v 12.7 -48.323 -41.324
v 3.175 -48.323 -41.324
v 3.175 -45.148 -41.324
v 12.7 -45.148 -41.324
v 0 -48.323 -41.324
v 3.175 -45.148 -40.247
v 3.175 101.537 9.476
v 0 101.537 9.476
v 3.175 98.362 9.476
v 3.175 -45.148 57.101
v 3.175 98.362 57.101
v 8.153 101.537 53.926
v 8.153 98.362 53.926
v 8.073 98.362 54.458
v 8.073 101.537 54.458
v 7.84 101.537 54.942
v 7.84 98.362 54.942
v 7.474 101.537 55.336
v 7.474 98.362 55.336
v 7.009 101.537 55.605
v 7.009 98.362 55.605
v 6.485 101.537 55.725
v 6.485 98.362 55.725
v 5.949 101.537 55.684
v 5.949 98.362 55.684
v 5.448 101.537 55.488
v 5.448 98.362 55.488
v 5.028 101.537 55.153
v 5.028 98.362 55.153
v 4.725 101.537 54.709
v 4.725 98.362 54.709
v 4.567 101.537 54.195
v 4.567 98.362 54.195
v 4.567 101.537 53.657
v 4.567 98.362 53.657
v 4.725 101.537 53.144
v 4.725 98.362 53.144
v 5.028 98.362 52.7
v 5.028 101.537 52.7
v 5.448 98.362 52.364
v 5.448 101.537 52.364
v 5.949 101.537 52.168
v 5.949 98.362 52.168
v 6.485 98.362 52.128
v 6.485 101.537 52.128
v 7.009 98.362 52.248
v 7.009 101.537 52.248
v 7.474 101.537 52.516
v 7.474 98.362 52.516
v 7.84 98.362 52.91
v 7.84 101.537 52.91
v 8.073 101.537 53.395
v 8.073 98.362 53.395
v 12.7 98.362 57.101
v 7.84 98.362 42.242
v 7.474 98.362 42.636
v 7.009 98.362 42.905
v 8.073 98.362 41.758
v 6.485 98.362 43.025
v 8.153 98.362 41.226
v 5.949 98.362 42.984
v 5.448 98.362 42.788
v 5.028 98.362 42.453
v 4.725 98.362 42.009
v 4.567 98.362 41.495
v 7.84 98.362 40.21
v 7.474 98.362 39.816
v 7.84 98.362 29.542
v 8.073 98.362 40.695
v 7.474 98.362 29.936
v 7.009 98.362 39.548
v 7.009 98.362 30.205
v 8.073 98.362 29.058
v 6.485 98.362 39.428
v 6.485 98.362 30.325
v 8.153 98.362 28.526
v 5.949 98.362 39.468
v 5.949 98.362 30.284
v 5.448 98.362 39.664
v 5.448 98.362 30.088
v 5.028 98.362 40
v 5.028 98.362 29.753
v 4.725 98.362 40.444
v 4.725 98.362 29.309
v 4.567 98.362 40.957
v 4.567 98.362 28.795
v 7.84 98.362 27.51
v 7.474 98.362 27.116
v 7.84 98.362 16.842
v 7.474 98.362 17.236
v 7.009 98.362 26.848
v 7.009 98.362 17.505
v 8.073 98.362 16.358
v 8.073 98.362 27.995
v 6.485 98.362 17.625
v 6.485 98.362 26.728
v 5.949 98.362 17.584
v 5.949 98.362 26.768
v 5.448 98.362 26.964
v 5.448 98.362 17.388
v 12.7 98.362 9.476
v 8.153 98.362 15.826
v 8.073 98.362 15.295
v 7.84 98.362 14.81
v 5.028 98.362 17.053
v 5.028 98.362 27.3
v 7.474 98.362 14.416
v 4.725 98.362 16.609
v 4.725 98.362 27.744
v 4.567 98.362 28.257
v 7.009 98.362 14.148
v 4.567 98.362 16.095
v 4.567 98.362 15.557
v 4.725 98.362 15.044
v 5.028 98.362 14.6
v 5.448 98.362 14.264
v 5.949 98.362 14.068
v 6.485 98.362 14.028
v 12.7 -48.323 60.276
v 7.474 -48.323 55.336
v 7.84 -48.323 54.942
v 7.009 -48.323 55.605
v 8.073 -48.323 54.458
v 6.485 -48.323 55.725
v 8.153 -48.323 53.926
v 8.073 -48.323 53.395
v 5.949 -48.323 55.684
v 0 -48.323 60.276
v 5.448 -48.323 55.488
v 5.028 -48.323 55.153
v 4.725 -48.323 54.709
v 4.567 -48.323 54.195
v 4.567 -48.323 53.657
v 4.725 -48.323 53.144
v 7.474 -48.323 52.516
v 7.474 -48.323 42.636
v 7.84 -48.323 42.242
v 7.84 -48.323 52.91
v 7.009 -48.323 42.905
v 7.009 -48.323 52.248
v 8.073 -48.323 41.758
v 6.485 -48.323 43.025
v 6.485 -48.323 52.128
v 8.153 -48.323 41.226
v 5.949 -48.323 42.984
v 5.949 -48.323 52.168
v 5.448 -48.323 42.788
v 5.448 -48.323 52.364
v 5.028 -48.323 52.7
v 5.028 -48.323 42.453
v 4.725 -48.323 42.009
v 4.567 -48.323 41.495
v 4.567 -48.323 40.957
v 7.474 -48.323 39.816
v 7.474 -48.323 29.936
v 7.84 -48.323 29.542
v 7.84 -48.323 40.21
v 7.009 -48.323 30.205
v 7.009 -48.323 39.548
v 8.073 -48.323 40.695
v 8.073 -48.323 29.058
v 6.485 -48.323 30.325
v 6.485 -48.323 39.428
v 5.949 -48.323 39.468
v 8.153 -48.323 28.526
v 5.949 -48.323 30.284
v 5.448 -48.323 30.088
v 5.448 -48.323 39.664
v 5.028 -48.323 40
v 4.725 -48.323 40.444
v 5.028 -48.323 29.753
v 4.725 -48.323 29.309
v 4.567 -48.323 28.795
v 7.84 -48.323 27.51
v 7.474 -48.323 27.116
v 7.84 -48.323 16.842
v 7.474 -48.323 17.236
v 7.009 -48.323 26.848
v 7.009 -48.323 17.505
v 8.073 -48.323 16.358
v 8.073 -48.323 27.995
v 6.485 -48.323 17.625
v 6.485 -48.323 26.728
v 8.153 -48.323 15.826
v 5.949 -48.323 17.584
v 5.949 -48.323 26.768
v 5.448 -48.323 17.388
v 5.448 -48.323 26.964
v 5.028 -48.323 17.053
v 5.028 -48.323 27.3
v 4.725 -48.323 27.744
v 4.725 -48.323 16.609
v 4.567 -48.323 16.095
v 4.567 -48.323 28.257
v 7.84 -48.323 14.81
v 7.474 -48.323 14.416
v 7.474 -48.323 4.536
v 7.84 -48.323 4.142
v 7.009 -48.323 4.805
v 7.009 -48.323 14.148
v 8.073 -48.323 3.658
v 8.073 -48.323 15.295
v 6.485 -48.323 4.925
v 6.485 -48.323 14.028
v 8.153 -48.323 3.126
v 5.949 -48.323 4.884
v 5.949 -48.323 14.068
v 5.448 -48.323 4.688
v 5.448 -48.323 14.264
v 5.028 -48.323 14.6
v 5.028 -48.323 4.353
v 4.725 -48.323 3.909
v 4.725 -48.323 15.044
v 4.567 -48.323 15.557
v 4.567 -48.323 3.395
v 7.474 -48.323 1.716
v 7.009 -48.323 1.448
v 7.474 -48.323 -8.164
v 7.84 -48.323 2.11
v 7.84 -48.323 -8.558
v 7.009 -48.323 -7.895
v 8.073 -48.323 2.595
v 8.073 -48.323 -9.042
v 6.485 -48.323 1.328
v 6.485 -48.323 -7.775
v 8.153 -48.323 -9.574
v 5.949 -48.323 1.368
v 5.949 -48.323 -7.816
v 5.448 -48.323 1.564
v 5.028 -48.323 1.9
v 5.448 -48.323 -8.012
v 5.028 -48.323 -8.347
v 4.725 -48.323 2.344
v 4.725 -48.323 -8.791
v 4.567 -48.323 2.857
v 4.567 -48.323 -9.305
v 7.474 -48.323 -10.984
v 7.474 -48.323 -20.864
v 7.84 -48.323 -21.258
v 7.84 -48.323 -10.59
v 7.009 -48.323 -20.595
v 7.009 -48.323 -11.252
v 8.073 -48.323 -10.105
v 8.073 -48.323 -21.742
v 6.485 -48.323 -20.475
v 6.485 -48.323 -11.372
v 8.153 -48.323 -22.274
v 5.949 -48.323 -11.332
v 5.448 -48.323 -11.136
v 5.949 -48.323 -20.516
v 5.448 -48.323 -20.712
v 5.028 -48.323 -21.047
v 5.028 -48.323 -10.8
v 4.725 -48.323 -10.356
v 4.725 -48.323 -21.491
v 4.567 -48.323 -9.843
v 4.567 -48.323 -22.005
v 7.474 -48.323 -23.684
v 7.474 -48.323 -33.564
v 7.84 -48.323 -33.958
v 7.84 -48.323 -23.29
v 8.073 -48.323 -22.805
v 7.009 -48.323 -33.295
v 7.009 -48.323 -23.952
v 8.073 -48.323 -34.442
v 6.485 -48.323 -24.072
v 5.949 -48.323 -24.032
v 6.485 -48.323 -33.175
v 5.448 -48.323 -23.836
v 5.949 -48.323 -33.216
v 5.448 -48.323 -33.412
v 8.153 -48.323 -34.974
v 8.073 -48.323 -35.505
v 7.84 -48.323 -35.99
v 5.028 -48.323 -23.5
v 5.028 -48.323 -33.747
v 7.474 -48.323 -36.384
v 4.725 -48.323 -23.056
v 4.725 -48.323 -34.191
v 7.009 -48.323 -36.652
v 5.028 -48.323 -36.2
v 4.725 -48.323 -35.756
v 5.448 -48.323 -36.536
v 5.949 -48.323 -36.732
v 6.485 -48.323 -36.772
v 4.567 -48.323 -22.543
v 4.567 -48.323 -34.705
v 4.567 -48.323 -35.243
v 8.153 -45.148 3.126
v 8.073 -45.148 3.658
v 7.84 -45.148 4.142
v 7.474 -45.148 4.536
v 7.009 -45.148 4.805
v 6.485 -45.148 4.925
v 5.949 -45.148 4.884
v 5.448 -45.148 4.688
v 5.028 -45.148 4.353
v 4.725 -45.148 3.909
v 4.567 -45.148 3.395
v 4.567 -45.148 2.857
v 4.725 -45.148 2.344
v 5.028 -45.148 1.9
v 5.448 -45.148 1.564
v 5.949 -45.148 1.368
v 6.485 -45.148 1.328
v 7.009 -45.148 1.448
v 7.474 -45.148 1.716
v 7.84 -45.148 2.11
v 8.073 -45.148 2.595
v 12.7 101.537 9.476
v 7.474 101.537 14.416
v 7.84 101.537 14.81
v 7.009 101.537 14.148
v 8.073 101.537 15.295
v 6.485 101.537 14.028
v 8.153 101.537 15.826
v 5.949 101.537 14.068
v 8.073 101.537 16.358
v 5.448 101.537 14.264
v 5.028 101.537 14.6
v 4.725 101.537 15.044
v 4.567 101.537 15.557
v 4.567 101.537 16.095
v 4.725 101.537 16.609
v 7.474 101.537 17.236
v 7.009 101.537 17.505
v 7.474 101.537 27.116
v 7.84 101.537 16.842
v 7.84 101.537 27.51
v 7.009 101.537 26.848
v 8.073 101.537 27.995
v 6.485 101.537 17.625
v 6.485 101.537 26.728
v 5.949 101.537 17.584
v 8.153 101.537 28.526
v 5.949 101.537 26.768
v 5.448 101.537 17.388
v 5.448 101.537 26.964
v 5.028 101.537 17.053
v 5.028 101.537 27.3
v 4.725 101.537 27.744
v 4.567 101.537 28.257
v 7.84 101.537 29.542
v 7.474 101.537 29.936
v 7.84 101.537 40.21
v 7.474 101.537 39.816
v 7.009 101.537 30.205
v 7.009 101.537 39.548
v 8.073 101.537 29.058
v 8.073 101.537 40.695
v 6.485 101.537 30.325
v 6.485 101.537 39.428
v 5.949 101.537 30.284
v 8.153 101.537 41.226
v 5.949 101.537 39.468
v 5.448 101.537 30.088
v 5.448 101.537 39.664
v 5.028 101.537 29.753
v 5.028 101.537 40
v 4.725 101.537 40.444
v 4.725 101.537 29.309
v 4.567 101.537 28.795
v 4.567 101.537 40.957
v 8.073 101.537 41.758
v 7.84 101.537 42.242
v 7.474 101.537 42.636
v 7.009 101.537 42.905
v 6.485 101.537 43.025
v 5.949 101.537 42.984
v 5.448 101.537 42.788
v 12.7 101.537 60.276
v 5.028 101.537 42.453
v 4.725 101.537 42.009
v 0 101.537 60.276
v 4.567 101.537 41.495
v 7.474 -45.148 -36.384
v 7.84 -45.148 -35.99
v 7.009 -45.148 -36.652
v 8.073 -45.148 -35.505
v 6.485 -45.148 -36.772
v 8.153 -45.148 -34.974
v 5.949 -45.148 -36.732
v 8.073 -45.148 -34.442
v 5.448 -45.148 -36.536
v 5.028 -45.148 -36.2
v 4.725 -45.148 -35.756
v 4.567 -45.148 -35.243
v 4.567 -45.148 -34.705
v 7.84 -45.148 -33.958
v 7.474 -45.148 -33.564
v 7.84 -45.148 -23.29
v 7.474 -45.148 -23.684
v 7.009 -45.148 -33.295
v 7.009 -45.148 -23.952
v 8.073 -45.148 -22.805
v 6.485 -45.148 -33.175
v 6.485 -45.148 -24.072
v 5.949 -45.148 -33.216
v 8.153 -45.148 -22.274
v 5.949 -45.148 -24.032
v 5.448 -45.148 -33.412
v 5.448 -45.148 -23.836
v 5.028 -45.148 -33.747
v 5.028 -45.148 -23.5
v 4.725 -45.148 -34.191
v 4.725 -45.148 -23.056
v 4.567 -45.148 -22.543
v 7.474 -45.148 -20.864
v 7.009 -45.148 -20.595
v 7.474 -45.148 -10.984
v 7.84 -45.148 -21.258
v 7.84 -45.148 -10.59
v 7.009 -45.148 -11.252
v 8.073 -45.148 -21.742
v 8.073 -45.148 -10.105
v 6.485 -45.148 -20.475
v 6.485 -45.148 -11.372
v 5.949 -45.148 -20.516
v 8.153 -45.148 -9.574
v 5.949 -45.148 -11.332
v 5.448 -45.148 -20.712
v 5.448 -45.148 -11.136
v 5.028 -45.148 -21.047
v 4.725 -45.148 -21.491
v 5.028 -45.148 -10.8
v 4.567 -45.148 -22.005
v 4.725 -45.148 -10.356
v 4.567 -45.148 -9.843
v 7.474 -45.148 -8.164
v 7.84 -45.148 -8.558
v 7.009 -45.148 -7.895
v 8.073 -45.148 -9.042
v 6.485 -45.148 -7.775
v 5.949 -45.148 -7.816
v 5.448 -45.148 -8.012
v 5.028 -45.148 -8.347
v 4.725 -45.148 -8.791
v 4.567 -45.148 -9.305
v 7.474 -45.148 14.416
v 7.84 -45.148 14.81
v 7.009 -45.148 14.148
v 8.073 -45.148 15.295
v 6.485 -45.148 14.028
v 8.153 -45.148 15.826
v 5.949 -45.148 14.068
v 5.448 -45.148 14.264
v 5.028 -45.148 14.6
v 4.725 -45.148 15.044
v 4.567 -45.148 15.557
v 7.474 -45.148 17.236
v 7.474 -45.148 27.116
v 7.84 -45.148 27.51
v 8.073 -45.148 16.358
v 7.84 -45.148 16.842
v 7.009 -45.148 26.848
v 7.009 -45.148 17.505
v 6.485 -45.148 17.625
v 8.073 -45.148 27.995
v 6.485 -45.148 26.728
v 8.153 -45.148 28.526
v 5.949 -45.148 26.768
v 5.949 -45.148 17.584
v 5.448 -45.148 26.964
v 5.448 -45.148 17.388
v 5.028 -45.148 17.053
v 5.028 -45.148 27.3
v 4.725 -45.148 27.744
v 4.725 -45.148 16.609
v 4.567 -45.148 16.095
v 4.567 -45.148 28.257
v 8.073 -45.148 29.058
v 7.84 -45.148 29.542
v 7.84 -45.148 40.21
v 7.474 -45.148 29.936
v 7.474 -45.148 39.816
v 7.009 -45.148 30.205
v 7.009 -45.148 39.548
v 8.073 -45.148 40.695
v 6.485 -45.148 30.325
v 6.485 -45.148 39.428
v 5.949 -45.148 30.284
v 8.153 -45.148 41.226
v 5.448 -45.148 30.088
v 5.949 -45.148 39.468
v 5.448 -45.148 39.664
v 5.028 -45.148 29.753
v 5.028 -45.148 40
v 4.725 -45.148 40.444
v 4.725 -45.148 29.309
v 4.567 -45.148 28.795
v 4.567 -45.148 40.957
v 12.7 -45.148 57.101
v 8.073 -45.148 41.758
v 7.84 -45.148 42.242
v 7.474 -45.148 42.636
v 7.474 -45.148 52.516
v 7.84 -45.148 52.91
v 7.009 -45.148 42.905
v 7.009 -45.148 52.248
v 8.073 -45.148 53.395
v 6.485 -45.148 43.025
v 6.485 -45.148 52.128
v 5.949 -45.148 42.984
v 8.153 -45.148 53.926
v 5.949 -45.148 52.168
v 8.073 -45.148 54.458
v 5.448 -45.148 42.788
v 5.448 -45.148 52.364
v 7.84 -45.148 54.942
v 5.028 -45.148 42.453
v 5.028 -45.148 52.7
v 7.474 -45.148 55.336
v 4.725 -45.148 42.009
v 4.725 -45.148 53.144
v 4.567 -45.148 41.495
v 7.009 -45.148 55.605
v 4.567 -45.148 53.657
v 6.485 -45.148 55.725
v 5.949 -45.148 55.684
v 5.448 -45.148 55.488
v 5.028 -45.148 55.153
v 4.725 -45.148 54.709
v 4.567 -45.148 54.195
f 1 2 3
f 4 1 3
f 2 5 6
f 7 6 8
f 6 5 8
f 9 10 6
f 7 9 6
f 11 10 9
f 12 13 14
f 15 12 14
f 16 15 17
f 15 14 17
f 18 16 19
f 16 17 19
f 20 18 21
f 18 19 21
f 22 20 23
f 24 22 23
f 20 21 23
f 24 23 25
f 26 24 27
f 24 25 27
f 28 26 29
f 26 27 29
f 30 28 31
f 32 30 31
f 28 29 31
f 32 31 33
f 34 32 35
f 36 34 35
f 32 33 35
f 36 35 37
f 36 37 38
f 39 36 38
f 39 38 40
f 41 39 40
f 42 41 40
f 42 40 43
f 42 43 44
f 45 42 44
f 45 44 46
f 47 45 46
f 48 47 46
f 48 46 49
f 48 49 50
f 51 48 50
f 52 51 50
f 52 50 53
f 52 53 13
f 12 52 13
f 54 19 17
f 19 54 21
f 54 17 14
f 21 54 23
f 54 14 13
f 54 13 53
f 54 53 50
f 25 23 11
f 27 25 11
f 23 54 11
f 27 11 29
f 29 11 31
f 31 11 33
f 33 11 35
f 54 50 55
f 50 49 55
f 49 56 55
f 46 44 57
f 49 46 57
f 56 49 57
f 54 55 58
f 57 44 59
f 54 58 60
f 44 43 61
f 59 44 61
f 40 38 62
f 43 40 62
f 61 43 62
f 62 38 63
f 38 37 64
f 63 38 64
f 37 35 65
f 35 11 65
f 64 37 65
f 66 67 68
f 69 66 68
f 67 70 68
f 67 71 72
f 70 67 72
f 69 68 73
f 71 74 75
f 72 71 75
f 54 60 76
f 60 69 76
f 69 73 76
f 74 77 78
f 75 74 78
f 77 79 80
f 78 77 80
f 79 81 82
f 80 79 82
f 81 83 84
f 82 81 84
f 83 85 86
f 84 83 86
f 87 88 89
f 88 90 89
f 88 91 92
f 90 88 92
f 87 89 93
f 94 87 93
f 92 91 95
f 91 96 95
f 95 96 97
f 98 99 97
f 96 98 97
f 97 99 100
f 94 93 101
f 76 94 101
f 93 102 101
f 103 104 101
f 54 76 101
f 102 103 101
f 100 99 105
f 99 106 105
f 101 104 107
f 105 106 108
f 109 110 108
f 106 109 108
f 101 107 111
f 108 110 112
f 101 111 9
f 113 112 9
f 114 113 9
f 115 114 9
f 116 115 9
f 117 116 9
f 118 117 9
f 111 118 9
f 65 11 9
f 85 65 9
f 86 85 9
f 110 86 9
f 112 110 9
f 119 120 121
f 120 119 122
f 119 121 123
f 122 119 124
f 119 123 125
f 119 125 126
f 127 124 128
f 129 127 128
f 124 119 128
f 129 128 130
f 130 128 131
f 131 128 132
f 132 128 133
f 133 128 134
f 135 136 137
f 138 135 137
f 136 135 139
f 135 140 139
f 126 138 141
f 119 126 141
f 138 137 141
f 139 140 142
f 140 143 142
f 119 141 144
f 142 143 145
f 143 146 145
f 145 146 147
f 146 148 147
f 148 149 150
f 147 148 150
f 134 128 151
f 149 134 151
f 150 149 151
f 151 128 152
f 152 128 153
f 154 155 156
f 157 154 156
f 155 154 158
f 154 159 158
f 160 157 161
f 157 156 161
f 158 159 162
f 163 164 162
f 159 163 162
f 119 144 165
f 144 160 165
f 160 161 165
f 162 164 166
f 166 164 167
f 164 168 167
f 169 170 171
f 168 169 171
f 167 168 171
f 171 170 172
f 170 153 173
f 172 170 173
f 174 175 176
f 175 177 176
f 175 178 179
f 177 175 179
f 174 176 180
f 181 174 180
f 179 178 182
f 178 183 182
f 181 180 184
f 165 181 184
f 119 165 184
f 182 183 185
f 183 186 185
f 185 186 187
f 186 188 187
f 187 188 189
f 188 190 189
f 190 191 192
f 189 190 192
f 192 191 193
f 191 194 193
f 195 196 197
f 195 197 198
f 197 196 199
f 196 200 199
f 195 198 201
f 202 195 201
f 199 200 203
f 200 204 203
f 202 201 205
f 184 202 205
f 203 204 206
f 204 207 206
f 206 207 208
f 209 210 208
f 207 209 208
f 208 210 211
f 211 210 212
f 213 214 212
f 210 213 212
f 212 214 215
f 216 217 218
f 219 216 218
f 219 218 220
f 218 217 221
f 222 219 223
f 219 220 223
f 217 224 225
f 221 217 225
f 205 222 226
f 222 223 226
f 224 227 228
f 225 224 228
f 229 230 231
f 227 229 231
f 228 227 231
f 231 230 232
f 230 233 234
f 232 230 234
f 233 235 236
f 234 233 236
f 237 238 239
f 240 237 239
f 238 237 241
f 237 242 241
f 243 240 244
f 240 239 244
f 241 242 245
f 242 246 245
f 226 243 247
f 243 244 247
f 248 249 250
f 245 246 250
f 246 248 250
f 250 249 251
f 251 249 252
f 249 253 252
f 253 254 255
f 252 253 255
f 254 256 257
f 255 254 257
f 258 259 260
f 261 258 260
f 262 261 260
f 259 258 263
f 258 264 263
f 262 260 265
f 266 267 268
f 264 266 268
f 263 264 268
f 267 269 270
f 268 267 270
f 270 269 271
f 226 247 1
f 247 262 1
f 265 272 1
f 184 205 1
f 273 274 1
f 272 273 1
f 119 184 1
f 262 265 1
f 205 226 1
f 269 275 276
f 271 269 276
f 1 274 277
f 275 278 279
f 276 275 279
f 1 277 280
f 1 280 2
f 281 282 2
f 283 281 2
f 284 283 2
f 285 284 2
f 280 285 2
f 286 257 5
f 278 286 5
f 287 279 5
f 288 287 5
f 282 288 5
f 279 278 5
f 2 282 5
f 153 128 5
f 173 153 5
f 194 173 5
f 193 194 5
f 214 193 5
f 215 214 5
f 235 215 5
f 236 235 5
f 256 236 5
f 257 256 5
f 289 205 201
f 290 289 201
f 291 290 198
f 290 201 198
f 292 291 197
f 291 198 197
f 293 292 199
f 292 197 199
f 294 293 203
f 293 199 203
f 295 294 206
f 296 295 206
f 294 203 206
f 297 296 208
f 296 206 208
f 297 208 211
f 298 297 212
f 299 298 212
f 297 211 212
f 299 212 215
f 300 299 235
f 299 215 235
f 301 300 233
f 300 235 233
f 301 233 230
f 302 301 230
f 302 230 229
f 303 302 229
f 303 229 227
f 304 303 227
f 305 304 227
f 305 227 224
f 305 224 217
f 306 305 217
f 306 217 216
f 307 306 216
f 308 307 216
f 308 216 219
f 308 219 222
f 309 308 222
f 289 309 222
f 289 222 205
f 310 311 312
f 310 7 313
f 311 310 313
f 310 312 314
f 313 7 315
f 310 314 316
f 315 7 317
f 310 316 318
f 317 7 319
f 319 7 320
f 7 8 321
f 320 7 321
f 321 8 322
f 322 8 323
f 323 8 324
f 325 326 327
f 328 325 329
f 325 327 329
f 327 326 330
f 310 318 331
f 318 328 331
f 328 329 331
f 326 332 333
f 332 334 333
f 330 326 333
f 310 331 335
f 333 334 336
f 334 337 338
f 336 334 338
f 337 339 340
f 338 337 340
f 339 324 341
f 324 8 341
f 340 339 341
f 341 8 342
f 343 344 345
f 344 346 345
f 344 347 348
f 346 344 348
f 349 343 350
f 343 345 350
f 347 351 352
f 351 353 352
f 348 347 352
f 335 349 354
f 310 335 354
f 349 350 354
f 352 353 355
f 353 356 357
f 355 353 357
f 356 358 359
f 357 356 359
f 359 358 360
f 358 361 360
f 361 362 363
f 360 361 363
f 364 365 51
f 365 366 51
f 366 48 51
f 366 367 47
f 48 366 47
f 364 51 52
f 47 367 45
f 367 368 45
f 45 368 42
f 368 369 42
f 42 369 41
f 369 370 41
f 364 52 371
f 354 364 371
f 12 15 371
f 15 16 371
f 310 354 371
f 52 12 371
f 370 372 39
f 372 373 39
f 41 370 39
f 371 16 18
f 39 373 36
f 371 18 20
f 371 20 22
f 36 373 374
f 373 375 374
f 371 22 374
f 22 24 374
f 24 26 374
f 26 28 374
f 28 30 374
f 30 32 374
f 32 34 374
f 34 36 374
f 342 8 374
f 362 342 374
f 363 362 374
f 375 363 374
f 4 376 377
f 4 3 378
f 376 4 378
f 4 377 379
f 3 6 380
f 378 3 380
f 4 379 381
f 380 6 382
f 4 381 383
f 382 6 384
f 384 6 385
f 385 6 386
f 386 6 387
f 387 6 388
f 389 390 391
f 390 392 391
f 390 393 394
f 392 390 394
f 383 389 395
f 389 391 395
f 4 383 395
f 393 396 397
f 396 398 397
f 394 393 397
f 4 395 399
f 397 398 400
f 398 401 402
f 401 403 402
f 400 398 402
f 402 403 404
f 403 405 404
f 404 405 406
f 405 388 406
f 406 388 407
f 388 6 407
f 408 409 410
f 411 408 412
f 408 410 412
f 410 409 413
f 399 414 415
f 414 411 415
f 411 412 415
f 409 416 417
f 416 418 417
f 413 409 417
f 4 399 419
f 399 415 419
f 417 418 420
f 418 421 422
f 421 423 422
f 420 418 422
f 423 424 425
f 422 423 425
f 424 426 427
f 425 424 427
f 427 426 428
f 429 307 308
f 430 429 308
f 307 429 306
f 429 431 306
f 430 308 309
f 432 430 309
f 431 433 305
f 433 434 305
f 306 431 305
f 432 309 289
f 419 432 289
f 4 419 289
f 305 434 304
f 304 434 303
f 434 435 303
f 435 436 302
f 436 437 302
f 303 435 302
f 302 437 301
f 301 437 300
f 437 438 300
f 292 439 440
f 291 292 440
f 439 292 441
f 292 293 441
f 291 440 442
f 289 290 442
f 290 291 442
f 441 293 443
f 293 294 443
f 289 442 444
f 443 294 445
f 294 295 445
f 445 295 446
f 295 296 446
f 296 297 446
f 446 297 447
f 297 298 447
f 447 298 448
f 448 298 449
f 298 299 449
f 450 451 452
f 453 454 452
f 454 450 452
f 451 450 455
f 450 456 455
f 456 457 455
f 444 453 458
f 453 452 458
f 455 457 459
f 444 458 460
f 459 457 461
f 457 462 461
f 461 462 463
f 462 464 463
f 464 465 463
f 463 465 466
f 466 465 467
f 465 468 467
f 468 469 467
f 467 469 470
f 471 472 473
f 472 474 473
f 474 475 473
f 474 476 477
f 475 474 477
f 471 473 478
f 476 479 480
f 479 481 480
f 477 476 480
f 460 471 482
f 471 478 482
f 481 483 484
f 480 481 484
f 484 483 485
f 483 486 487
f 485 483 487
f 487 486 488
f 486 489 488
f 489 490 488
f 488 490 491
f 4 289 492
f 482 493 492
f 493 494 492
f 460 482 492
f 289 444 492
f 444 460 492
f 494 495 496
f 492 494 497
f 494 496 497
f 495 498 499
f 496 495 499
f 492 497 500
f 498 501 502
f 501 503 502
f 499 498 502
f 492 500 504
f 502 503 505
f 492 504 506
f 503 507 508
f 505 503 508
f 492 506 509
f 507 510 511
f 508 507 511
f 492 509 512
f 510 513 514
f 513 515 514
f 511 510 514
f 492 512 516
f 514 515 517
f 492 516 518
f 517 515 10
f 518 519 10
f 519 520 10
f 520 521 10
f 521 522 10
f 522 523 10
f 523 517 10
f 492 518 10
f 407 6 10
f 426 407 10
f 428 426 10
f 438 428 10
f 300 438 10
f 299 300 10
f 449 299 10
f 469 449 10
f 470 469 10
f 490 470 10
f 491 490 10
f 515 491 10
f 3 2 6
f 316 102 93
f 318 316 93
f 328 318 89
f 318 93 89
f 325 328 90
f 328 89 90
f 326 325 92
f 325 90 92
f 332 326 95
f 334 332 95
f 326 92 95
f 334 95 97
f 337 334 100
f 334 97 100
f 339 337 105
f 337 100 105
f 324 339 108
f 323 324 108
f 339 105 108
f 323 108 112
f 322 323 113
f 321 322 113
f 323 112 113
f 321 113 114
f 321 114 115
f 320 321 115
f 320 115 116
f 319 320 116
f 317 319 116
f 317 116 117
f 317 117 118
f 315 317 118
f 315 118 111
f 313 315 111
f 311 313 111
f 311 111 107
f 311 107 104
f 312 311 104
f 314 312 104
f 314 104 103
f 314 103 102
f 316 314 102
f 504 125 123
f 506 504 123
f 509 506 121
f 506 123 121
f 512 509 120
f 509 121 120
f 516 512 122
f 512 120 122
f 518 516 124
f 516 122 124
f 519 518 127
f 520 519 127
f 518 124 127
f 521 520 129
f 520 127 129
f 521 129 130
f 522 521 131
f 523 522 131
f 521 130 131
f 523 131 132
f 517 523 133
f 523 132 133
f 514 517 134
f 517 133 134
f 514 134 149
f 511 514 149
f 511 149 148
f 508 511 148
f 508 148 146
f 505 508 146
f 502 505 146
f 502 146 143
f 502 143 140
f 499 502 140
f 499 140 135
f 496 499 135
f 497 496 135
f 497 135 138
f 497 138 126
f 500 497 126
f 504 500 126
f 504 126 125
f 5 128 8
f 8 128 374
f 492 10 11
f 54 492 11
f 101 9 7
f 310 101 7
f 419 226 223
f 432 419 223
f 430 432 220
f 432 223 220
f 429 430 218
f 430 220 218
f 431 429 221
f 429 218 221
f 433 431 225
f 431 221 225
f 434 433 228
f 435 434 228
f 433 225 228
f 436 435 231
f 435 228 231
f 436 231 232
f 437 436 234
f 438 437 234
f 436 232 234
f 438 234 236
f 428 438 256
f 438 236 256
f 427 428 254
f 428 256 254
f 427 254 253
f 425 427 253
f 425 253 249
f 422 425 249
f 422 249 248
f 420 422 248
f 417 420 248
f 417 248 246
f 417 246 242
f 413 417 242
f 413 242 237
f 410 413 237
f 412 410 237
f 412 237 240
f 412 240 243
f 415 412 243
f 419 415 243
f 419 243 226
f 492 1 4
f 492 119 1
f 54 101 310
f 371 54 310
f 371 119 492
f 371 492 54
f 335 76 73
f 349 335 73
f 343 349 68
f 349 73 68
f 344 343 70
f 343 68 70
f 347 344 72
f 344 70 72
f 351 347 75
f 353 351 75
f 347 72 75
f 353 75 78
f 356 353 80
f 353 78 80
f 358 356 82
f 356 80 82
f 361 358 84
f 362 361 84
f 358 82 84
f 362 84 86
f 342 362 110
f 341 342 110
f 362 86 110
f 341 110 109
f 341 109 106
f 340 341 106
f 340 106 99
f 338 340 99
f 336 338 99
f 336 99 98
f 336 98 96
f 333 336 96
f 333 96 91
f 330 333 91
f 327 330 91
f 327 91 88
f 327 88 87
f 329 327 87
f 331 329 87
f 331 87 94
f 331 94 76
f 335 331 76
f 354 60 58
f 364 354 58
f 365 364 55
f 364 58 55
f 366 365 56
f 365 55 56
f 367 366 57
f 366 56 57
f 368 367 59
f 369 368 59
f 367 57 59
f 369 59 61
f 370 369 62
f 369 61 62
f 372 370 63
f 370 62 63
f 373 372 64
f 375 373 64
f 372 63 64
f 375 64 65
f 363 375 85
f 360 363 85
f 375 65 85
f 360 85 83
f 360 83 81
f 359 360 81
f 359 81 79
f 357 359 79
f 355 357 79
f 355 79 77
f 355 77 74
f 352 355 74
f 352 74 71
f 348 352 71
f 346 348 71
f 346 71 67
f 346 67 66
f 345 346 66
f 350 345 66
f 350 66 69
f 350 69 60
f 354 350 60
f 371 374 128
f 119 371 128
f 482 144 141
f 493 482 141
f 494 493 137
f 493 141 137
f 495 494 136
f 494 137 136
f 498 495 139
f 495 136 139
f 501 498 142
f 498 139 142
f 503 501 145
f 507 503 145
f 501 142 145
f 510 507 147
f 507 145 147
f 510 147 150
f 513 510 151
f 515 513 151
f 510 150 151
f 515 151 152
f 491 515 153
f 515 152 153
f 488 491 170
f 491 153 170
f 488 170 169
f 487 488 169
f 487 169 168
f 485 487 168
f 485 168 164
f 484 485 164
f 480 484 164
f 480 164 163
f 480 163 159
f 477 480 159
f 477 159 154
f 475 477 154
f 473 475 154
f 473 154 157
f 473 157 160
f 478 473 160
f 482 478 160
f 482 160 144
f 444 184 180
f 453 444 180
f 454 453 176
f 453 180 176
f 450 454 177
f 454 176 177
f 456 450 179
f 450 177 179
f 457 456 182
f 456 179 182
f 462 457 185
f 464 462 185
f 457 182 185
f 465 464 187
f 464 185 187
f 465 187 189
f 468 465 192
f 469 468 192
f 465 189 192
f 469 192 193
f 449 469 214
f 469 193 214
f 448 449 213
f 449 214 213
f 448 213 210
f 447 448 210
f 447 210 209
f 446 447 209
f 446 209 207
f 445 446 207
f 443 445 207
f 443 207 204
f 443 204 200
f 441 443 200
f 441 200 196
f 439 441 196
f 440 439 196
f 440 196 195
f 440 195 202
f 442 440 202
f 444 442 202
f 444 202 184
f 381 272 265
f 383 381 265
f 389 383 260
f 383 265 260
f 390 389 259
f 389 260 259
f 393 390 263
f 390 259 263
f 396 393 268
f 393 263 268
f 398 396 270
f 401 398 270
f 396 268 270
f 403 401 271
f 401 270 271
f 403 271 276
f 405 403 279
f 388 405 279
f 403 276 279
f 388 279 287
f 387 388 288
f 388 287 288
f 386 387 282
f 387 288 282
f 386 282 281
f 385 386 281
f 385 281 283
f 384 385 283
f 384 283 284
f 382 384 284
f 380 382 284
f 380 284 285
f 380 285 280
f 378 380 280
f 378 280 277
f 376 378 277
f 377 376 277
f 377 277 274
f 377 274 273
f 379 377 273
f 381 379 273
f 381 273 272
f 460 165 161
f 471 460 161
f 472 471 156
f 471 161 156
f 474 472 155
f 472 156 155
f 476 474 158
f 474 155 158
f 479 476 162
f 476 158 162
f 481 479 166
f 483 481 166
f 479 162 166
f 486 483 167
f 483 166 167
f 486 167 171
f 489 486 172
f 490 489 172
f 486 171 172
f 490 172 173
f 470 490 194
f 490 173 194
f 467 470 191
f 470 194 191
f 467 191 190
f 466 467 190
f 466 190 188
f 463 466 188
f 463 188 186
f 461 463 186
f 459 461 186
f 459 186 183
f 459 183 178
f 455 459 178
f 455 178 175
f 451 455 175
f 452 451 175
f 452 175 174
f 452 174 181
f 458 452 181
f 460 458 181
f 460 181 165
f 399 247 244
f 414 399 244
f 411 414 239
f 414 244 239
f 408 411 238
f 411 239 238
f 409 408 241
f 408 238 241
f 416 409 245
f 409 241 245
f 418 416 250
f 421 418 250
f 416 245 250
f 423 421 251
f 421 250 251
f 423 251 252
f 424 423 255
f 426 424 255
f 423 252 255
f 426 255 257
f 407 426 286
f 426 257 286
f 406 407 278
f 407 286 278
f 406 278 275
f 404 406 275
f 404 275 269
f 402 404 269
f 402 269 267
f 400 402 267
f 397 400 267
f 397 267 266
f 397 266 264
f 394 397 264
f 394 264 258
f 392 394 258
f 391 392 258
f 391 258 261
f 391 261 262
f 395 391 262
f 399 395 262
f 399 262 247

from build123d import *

# Parameters (mm, degrees)
F1_DEPTH = 3.175
F3_DEPTH = 9.525
F4_R     = 1.8034
F5_DEPTH = 149.861


with BuildPart() as f1:
    # F0 (on Right) → F1 (new body)
    with BuildSketch(Plane.YZ):
        Polygon((-48.322902, 60.276262), (-48.322902, -41.323738), (101.537098, 9.476262), (101.537098, 60.276262), align=None)
    extrude(amount=F1_DEPTH)

    # F2 (on face) → F3 (join)
    with BuildSketch(Plane.YZ.offset(3.175)):
        Polygon((-48.322902, 57.101262), (-48.322902, -41.323738), (-45.147902, -41.323738), (-45.147902, 57.101262), (98.362098, 57.101262), (98.362098, 9.476262), (101.537098, 9.476262), (101.537098, 57.101262), (101.537098, 60.276262), (-48.322902, 60.276262), align=None)
    extrude(amount=F3_DEPTH)

    # F4 (on face) → F5 (cut, through all)
    with BuildSketch(Plane.XZ.offset(48.322902)):
        with Locations((6.35, -34.973738)):
            Circle(F4_R)
        with Locations((6.35, -22.273738)):
            Circle(F4_R)
        with Locations((6.35, -9.573738)):
            Circle(F4_R)
        with Locations((6.35, 3.126262)):
            Circle(F4_R)
        with Locations((6.35, 15.826262)):
            Circle(F4_R)
        with Locations((6.35, 28.526262)):
            Circle(F4_R)
        with Locations((6.35, 41.226262)):
            Circle(F4_R)
        with Locations((6.35, 53.926262)):
            Circle(F4_R)
    extrude(amount=-F5_DEPTH, mode=Mode.SUBTRACT)


solid = f1.part
